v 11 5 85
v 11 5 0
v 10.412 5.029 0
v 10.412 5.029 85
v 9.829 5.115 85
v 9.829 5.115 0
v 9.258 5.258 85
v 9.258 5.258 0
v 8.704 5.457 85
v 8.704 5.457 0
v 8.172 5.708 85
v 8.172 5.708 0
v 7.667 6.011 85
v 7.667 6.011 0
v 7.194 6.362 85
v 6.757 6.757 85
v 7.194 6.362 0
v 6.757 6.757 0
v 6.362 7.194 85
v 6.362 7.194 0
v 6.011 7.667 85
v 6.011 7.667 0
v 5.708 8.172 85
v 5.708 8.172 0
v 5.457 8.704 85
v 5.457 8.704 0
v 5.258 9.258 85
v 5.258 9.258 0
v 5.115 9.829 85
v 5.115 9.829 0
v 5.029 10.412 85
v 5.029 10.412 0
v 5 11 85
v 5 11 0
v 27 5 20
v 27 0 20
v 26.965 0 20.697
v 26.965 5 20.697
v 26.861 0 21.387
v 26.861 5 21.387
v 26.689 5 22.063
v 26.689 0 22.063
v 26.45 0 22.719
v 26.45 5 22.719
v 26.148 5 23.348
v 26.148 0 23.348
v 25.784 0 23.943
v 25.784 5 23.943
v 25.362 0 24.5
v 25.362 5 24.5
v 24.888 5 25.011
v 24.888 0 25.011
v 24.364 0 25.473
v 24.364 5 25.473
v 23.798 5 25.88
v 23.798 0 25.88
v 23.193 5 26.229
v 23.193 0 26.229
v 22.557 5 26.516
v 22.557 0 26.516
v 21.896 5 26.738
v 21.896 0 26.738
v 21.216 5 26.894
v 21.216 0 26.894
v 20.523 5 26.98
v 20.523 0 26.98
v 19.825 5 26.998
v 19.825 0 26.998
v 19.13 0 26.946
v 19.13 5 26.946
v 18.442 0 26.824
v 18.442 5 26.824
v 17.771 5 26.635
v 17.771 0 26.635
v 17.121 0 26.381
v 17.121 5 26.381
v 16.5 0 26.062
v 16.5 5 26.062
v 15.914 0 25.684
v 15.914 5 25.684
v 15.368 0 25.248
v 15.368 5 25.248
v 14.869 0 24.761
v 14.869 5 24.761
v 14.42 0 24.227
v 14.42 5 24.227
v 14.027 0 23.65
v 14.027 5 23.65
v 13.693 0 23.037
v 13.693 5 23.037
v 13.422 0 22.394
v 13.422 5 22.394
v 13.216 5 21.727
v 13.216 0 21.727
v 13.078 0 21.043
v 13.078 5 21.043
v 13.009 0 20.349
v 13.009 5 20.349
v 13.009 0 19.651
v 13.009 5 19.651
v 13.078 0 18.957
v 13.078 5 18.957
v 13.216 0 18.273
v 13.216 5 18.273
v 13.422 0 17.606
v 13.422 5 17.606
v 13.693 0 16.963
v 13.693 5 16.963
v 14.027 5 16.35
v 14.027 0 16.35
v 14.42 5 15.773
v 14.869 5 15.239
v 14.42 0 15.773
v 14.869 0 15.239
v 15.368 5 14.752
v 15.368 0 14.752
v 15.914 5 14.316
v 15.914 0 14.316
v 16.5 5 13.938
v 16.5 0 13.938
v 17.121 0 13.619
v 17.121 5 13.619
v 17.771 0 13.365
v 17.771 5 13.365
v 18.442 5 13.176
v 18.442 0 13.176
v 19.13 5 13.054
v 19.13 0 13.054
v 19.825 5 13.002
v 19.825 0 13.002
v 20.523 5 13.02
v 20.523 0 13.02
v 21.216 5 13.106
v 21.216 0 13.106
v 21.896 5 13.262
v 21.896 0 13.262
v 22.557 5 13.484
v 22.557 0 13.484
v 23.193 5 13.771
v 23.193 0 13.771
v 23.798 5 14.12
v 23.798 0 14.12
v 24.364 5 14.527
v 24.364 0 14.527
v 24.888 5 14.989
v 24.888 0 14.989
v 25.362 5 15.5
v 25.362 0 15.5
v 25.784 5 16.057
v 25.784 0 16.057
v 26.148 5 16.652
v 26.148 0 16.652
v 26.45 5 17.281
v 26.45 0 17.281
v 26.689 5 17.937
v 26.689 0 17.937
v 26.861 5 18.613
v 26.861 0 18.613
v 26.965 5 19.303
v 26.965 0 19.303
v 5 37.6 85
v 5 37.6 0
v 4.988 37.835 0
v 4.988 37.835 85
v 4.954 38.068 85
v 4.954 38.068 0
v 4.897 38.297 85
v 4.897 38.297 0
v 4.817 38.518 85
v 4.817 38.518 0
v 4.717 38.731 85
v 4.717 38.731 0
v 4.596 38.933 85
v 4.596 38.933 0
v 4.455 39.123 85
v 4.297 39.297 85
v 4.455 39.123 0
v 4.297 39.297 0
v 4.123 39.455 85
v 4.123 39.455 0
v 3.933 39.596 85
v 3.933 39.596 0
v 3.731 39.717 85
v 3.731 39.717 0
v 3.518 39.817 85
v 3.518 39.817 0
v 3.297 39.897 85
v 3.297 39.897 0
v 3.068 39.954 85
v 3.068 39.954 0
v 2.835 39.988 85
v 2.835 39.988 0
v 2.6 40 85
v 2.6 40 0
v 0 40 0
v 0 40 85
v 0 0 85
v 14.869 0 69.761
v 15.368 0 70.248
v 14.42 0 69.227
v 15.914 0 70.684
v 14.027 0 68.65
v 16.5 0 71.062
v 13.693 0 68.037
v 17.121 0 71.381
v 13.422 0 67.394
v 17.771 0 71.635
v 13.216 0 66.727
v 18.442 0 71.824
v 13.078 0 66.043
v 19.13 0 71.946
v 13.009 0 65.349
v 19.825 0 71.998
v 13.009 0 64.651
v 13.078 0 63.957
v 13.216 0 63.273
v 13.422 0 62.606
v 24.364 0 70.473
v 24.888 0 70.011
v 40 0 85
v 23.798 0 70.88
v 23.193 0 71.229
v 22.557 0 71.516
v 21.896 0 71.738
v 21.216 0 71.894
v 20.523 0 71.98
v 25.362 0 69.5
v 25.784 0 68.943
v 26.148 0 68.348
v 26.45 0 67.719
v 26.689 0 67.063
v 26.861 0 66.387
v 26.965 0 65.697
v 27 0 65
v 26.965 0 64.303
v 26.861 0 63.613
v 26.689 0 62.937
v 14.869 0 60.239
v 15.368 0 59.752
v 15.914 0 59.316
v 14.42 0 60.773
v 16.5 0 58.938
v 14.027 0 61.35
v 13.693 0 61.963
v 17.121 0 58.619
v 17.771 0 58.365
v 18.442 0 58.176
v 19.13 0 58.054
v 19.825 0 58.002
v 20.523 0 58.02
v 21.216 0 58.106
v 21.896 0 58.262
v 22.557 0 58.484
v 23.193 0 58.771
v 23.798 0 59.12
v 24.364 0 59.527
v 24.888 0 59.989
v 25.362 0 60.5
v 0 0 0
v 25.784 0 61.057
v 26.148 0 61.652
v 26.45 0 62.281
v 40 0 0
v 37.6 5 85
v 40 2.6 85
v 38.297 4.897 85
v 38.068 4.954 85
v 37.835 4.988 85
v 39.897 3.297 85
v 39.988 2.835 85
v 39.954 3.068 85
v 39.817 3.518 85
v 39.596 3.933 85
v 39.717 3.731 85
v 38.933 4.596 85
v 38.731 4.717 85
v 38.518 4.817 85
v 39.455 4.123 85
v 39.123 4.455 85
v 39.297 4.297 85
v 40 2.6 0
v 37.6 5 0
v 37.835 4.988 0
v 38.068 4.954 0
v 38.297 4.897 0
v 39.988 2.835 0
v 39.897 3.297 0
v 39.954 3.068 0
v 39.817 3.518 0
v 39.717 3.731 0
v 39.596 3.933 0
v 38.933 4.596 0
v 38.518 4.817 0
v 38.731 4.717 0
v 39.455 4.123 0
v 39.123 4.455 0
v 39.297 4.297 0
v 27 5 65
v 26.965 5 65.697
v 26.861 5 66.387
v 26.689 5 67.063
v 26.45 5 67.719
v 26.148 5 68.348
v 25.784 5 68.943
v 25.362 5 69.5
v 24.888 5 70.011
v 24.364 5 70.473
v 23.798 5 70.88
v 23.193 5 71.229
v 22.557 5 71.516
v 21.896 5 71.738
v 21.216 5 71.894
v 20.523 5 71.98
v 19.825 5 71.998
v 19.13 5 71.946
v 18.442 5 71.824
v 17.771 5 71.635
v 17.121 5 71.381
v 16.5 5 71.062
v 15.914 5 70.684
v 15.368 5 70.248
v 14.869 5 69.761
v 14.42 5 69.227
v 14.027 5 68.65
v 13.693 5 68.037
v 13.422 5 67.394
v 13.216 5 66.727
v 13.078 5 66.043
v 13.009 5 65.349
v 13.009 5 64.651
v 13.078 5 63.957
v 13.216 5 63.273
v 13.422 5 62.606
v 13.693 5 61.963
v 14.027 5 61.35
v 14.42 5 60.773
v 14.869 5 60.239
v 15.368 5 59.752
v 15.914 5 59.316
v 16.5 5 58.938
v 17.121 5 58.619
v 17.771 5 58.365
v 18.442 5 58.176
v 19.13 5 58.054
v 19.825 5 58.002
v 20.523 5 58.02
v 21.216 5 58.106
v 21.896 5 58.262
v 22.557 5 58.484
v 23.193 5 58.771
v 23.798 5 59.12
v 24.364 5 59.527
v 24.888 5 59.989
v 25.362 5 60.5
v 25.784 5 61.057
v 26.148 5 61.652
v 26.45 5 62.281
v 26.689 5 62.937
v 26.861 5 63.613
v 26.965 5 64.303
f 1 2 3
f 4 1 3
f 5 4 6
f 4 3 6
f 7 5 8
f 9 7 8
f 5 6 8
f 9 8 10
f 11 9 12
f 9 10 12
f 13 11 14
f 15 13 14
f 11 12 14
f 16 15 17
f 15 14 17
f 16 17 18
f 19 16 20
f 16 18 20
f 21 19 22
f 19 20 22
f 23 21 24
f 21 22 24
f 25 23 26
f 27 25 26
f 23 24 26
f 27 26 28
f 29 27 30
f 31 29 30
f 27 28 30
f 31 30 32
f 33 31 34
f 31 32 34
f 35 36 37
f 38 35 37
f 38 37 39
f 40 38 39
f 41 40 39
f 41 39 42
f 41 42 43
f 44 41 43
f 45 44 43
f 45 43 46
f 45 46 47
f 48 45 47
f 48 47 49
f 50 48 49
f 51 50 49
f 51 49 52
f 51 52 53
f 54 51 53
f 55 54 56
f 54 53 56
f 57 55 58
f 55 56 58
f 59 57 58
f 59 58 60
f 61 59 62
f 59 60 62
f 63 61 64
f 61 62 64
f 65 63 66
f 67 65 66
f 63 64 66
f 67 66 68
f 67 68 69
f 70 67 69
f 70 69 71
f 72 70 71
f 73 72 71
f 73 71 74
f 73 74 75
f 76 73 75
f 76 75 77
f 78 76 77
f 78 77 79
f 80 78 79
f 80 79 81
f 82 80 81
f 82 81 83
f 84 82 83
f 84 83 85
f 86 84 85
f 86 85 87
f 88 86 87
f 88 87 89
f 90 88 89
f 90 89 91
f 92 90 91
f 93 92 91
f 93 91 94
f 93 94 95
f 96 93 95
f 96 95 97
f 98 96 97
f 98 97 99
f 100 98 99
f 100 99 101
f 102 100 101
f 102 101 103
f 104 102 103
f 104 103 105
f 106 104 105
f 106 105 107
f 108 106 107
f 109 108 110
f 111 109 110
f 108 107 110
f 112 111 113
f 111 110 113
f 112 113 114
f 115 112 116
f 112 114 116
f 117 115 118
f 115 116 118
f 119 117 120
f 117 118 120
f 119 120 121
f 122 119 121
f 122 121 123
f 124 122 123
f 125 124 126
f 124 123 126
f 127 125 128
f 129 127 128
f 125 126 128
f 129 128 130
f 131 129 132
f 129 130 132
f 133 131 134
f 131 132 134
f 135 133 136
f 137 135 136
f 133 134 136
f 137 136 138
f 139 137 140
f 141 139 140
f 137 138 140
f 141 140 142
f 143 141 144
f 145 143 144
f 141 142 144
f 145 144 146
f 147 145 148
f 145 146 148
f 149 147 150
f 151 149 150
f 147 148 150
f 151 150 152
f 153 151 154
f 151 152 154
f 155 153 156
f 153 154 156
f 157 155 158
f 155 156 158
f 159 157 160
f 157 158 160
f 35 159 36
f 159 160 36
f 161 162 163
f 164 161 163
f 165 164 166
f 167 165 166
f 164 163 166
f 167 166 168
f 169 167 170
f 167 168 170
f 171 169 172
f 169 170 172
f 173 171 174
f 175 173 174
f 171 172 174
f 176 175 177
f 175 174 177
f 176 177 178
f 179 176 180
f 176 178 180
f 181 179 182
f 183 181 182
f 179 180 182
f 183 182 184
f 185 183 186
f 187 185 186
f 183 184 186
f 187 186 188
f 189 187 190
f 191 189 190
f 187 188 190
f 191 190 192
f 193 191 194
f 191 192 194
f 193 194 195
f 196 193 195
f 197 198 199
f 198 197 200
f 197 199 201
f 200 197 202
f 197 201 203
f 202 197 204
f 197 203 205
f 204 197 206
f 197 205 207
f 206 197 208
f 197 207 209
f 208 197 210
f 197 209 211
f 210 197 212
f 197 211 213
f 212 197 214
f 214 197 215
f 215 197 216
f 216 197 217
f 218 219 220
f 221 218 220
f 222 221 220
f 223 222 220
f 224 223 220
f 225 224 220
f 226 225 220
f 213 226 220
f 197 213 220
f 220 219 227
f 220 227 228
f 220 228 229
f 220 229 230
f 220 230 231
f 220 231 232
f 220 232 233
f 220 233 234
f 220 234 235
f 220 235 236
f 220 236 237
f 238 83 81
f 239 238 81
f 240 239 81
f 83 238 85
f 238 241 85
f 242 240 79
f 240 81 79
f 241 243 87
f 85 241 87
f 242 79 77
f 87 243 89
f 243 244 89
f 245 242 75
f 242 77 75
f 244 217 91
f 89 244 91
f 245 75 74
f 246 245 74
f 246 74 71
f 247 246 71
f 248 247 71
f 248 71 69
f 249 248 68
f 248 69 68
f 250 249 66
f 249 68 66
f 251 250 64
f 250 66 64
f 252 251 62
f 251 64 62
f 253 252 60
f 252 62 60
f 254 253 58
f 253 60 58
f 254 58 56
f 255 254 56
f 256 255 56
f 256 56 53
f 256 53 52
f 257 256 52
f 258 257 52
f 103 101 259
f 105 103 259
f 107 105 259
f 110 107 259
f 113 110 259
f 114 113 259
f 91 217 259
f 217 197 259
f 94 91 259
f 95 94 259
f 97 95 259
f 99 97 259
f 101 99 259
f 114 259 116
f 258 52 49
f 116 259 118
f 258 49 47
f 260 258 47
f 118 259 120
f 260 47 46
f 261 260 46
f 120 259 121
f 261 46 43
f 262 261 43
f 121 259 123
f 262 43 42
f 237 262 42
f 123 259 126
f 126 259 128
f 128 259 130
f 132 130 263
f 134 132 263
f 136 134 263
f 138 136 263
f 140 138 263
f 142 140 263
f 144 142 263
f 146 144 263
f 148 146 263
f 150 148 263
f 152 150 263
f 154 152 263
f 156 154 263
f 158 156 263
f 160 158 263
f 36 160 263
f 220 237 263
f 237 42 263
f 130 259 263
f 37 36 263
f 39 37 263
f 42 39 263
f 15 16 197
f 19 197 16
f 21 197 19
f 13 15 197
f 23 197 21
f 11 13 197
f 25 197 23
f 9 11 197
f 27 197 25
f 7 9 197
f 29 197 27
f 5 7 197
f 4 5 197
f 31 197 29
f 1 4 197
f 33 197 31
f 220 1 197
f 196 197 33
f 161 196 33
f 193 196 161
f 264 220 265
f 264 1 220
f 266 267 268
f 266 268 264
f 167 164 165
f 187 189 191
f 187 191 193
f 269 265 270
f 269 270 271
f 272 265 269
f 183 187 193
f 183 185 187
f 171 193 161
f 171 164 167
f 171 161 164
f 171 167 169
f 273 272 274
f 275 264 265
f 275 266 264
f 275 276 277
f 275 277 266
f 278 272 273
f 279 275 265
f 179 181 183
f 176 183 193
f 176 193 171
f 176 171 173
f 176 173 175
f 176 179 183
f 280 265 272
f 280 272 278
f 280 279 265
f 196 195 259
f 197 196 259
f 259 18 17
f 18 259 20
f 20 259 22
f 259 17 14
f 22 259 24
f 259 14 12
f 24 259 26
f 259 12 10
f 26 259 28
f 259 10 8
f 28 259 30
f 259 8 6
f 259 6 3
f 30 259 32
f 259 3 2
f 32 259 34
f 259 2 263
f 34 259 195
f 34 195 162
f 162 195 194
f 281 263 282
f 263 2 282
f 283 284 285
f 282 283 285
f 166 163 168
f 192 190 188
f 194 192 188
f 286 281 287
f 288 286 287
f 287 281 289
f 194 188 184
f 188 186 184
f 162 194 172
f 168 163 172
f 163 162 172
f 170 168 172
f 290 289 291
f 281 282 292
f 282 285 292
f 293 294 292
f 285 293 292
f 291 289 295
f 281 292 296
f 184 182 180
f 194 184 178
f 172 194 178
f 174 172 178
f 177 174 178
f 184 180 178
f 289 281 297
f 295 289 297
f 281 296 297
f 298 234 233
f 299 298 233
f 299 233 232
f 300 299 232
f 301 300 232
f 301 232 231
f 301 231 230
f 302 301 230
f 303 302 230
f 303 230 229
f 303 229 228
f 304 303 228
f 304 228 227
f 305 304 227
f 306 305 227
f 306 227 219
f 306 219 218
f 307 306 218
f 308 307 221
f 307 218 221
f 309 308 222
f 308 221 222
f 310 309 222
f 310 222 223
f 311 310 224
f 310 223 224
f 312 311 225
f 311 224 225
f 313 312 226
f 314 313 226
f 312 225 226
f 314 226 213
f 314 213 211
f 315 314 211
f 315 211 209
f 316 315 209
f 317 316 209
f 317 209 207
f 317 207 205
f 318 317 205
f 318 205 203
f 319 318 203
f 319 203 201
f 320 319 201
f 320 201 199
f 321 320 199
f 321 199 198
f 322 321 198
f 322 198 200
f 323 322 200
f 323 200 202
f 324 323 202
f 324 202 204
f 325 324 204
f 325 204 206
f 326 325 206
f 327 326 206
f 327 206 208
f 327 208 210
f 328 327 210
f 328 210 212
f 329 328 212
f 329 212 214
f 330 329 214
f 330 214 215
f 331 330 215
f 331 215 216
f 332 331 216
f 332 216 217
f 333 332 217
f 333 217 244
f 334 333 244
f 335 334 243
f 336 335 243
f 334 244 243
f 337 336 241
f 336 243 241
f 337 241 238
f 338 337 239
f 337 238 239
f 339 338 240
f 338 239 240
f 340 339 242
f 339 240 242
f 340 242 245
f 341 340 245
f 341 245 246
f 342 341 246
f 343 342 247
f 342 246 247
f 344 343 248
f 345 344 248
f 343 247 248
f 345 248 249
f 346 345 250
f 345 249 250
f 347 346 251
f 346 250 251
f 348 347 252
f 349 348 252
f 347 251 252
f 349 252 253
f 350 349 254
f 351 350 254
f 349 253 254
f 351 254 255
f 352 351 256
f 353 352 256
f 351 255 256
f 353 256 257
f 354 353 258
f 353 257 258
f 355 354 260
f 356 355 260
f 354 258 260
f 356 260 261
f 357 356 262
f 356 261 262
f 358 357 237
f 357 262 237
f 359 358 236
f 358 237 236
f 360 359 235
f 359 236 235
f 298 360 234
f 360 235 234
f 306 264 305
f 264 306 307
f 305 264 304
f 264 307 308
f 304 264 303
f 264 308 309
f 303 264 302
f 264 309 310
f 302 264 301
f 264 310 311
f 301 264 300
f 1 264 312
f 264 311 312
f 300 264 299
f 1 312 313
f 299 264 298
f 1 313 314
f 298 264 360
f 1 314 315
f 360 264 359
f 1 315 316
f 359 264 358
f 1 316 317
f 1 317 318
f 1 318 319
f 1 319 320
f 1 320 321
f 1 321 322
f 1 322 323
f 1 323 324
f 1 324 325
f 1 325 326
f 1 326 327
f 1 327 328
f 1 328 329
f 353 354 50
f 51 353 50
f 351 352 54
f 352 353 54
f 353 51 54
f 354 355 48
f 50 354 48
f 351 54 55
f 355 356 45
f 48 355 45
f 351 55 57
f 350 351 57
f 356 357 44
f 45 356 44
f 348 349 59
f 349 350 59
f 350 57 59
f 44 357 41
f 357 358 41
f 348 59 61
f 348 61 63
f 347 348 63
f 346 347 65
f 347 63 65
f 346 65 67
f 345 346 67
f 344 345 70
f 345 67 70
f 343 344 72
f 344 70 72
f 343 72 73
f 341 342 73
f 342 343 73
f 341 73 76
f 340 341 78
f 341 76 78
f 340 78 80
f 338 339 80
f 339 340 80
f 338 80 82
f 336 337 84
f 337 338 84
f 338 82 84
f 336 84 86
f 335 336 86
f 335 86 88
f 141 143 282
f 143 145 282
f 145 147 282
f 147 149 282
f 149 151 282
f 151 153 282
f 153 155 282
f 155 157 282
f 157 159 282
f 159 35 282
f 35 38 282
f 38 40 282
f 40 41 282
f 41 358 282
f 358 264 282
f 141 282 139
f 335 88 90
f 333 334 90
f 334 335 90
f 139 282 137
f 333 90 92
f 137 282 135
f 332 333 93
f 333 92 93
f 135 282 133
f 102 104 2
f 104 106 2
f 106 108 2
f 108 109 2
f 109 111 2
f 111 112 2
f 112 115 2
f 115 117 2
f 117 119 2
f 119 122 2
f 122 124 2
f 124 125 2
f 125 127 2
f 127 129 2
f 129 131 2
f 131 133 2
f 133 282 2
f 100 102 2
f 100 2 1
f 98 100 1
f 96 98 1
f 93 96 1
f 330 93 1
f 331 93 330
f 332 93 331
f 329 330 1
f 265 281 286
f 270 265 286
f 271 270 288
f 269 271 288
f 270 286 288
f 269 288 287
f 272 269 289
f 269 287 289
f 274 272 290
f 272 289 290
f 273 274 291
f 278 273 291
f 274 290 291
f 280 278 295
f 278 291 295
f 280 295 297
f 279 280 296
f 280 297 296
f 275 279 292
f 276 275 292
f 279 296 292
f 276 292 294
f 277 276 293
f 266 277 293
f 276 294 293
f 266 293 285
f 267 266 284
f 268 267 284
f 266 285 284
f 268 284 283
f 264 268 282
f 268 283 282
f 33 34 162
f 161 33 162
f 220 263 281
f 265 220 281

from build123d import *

# Parameters (mm, degrees)
F1_DEPTH = 85
F2_R     = 7
F3_DEPTH = 40.001


with BuildPart() as f1:
    # F0 (on Top) → F1 (new body)
    with BuildSketch(Plane.XY):
        with BuildLine():
            Line((0, 40), (0, 0))
            Line((0, 0), (40, 0))
            Line((40, 0), (40, 2.6))
            ThreePointArc((40, 2.6), (39.297056, 4.297056), (37.6, 5))
            Line((37.6, 5), (11, 5))
            ThreePointArc((11, 5), (6.757359, 6.757359), (5, 11))
            Line((5, 11), (5, 37.6))
            ThreePointArc((5, 37.6), (4.297056, 39.297056), (2.6, 40))
            Line((2.6, 40), (0, 40))
        make_face()
    extrude(amount=F1_DEPTH)

    # F2 (on face) → F3 (cut, through all)
    with BuildSketch(Plane.XZ):
        with Locations((20, 65)):
            Circle(F2_R)
        with Locations((20, 20)):
            Circle(F2_R)
    extrude(amount=-F3_DEPTH, mode=Mode.SUBTRACT)


solid = f1.part
